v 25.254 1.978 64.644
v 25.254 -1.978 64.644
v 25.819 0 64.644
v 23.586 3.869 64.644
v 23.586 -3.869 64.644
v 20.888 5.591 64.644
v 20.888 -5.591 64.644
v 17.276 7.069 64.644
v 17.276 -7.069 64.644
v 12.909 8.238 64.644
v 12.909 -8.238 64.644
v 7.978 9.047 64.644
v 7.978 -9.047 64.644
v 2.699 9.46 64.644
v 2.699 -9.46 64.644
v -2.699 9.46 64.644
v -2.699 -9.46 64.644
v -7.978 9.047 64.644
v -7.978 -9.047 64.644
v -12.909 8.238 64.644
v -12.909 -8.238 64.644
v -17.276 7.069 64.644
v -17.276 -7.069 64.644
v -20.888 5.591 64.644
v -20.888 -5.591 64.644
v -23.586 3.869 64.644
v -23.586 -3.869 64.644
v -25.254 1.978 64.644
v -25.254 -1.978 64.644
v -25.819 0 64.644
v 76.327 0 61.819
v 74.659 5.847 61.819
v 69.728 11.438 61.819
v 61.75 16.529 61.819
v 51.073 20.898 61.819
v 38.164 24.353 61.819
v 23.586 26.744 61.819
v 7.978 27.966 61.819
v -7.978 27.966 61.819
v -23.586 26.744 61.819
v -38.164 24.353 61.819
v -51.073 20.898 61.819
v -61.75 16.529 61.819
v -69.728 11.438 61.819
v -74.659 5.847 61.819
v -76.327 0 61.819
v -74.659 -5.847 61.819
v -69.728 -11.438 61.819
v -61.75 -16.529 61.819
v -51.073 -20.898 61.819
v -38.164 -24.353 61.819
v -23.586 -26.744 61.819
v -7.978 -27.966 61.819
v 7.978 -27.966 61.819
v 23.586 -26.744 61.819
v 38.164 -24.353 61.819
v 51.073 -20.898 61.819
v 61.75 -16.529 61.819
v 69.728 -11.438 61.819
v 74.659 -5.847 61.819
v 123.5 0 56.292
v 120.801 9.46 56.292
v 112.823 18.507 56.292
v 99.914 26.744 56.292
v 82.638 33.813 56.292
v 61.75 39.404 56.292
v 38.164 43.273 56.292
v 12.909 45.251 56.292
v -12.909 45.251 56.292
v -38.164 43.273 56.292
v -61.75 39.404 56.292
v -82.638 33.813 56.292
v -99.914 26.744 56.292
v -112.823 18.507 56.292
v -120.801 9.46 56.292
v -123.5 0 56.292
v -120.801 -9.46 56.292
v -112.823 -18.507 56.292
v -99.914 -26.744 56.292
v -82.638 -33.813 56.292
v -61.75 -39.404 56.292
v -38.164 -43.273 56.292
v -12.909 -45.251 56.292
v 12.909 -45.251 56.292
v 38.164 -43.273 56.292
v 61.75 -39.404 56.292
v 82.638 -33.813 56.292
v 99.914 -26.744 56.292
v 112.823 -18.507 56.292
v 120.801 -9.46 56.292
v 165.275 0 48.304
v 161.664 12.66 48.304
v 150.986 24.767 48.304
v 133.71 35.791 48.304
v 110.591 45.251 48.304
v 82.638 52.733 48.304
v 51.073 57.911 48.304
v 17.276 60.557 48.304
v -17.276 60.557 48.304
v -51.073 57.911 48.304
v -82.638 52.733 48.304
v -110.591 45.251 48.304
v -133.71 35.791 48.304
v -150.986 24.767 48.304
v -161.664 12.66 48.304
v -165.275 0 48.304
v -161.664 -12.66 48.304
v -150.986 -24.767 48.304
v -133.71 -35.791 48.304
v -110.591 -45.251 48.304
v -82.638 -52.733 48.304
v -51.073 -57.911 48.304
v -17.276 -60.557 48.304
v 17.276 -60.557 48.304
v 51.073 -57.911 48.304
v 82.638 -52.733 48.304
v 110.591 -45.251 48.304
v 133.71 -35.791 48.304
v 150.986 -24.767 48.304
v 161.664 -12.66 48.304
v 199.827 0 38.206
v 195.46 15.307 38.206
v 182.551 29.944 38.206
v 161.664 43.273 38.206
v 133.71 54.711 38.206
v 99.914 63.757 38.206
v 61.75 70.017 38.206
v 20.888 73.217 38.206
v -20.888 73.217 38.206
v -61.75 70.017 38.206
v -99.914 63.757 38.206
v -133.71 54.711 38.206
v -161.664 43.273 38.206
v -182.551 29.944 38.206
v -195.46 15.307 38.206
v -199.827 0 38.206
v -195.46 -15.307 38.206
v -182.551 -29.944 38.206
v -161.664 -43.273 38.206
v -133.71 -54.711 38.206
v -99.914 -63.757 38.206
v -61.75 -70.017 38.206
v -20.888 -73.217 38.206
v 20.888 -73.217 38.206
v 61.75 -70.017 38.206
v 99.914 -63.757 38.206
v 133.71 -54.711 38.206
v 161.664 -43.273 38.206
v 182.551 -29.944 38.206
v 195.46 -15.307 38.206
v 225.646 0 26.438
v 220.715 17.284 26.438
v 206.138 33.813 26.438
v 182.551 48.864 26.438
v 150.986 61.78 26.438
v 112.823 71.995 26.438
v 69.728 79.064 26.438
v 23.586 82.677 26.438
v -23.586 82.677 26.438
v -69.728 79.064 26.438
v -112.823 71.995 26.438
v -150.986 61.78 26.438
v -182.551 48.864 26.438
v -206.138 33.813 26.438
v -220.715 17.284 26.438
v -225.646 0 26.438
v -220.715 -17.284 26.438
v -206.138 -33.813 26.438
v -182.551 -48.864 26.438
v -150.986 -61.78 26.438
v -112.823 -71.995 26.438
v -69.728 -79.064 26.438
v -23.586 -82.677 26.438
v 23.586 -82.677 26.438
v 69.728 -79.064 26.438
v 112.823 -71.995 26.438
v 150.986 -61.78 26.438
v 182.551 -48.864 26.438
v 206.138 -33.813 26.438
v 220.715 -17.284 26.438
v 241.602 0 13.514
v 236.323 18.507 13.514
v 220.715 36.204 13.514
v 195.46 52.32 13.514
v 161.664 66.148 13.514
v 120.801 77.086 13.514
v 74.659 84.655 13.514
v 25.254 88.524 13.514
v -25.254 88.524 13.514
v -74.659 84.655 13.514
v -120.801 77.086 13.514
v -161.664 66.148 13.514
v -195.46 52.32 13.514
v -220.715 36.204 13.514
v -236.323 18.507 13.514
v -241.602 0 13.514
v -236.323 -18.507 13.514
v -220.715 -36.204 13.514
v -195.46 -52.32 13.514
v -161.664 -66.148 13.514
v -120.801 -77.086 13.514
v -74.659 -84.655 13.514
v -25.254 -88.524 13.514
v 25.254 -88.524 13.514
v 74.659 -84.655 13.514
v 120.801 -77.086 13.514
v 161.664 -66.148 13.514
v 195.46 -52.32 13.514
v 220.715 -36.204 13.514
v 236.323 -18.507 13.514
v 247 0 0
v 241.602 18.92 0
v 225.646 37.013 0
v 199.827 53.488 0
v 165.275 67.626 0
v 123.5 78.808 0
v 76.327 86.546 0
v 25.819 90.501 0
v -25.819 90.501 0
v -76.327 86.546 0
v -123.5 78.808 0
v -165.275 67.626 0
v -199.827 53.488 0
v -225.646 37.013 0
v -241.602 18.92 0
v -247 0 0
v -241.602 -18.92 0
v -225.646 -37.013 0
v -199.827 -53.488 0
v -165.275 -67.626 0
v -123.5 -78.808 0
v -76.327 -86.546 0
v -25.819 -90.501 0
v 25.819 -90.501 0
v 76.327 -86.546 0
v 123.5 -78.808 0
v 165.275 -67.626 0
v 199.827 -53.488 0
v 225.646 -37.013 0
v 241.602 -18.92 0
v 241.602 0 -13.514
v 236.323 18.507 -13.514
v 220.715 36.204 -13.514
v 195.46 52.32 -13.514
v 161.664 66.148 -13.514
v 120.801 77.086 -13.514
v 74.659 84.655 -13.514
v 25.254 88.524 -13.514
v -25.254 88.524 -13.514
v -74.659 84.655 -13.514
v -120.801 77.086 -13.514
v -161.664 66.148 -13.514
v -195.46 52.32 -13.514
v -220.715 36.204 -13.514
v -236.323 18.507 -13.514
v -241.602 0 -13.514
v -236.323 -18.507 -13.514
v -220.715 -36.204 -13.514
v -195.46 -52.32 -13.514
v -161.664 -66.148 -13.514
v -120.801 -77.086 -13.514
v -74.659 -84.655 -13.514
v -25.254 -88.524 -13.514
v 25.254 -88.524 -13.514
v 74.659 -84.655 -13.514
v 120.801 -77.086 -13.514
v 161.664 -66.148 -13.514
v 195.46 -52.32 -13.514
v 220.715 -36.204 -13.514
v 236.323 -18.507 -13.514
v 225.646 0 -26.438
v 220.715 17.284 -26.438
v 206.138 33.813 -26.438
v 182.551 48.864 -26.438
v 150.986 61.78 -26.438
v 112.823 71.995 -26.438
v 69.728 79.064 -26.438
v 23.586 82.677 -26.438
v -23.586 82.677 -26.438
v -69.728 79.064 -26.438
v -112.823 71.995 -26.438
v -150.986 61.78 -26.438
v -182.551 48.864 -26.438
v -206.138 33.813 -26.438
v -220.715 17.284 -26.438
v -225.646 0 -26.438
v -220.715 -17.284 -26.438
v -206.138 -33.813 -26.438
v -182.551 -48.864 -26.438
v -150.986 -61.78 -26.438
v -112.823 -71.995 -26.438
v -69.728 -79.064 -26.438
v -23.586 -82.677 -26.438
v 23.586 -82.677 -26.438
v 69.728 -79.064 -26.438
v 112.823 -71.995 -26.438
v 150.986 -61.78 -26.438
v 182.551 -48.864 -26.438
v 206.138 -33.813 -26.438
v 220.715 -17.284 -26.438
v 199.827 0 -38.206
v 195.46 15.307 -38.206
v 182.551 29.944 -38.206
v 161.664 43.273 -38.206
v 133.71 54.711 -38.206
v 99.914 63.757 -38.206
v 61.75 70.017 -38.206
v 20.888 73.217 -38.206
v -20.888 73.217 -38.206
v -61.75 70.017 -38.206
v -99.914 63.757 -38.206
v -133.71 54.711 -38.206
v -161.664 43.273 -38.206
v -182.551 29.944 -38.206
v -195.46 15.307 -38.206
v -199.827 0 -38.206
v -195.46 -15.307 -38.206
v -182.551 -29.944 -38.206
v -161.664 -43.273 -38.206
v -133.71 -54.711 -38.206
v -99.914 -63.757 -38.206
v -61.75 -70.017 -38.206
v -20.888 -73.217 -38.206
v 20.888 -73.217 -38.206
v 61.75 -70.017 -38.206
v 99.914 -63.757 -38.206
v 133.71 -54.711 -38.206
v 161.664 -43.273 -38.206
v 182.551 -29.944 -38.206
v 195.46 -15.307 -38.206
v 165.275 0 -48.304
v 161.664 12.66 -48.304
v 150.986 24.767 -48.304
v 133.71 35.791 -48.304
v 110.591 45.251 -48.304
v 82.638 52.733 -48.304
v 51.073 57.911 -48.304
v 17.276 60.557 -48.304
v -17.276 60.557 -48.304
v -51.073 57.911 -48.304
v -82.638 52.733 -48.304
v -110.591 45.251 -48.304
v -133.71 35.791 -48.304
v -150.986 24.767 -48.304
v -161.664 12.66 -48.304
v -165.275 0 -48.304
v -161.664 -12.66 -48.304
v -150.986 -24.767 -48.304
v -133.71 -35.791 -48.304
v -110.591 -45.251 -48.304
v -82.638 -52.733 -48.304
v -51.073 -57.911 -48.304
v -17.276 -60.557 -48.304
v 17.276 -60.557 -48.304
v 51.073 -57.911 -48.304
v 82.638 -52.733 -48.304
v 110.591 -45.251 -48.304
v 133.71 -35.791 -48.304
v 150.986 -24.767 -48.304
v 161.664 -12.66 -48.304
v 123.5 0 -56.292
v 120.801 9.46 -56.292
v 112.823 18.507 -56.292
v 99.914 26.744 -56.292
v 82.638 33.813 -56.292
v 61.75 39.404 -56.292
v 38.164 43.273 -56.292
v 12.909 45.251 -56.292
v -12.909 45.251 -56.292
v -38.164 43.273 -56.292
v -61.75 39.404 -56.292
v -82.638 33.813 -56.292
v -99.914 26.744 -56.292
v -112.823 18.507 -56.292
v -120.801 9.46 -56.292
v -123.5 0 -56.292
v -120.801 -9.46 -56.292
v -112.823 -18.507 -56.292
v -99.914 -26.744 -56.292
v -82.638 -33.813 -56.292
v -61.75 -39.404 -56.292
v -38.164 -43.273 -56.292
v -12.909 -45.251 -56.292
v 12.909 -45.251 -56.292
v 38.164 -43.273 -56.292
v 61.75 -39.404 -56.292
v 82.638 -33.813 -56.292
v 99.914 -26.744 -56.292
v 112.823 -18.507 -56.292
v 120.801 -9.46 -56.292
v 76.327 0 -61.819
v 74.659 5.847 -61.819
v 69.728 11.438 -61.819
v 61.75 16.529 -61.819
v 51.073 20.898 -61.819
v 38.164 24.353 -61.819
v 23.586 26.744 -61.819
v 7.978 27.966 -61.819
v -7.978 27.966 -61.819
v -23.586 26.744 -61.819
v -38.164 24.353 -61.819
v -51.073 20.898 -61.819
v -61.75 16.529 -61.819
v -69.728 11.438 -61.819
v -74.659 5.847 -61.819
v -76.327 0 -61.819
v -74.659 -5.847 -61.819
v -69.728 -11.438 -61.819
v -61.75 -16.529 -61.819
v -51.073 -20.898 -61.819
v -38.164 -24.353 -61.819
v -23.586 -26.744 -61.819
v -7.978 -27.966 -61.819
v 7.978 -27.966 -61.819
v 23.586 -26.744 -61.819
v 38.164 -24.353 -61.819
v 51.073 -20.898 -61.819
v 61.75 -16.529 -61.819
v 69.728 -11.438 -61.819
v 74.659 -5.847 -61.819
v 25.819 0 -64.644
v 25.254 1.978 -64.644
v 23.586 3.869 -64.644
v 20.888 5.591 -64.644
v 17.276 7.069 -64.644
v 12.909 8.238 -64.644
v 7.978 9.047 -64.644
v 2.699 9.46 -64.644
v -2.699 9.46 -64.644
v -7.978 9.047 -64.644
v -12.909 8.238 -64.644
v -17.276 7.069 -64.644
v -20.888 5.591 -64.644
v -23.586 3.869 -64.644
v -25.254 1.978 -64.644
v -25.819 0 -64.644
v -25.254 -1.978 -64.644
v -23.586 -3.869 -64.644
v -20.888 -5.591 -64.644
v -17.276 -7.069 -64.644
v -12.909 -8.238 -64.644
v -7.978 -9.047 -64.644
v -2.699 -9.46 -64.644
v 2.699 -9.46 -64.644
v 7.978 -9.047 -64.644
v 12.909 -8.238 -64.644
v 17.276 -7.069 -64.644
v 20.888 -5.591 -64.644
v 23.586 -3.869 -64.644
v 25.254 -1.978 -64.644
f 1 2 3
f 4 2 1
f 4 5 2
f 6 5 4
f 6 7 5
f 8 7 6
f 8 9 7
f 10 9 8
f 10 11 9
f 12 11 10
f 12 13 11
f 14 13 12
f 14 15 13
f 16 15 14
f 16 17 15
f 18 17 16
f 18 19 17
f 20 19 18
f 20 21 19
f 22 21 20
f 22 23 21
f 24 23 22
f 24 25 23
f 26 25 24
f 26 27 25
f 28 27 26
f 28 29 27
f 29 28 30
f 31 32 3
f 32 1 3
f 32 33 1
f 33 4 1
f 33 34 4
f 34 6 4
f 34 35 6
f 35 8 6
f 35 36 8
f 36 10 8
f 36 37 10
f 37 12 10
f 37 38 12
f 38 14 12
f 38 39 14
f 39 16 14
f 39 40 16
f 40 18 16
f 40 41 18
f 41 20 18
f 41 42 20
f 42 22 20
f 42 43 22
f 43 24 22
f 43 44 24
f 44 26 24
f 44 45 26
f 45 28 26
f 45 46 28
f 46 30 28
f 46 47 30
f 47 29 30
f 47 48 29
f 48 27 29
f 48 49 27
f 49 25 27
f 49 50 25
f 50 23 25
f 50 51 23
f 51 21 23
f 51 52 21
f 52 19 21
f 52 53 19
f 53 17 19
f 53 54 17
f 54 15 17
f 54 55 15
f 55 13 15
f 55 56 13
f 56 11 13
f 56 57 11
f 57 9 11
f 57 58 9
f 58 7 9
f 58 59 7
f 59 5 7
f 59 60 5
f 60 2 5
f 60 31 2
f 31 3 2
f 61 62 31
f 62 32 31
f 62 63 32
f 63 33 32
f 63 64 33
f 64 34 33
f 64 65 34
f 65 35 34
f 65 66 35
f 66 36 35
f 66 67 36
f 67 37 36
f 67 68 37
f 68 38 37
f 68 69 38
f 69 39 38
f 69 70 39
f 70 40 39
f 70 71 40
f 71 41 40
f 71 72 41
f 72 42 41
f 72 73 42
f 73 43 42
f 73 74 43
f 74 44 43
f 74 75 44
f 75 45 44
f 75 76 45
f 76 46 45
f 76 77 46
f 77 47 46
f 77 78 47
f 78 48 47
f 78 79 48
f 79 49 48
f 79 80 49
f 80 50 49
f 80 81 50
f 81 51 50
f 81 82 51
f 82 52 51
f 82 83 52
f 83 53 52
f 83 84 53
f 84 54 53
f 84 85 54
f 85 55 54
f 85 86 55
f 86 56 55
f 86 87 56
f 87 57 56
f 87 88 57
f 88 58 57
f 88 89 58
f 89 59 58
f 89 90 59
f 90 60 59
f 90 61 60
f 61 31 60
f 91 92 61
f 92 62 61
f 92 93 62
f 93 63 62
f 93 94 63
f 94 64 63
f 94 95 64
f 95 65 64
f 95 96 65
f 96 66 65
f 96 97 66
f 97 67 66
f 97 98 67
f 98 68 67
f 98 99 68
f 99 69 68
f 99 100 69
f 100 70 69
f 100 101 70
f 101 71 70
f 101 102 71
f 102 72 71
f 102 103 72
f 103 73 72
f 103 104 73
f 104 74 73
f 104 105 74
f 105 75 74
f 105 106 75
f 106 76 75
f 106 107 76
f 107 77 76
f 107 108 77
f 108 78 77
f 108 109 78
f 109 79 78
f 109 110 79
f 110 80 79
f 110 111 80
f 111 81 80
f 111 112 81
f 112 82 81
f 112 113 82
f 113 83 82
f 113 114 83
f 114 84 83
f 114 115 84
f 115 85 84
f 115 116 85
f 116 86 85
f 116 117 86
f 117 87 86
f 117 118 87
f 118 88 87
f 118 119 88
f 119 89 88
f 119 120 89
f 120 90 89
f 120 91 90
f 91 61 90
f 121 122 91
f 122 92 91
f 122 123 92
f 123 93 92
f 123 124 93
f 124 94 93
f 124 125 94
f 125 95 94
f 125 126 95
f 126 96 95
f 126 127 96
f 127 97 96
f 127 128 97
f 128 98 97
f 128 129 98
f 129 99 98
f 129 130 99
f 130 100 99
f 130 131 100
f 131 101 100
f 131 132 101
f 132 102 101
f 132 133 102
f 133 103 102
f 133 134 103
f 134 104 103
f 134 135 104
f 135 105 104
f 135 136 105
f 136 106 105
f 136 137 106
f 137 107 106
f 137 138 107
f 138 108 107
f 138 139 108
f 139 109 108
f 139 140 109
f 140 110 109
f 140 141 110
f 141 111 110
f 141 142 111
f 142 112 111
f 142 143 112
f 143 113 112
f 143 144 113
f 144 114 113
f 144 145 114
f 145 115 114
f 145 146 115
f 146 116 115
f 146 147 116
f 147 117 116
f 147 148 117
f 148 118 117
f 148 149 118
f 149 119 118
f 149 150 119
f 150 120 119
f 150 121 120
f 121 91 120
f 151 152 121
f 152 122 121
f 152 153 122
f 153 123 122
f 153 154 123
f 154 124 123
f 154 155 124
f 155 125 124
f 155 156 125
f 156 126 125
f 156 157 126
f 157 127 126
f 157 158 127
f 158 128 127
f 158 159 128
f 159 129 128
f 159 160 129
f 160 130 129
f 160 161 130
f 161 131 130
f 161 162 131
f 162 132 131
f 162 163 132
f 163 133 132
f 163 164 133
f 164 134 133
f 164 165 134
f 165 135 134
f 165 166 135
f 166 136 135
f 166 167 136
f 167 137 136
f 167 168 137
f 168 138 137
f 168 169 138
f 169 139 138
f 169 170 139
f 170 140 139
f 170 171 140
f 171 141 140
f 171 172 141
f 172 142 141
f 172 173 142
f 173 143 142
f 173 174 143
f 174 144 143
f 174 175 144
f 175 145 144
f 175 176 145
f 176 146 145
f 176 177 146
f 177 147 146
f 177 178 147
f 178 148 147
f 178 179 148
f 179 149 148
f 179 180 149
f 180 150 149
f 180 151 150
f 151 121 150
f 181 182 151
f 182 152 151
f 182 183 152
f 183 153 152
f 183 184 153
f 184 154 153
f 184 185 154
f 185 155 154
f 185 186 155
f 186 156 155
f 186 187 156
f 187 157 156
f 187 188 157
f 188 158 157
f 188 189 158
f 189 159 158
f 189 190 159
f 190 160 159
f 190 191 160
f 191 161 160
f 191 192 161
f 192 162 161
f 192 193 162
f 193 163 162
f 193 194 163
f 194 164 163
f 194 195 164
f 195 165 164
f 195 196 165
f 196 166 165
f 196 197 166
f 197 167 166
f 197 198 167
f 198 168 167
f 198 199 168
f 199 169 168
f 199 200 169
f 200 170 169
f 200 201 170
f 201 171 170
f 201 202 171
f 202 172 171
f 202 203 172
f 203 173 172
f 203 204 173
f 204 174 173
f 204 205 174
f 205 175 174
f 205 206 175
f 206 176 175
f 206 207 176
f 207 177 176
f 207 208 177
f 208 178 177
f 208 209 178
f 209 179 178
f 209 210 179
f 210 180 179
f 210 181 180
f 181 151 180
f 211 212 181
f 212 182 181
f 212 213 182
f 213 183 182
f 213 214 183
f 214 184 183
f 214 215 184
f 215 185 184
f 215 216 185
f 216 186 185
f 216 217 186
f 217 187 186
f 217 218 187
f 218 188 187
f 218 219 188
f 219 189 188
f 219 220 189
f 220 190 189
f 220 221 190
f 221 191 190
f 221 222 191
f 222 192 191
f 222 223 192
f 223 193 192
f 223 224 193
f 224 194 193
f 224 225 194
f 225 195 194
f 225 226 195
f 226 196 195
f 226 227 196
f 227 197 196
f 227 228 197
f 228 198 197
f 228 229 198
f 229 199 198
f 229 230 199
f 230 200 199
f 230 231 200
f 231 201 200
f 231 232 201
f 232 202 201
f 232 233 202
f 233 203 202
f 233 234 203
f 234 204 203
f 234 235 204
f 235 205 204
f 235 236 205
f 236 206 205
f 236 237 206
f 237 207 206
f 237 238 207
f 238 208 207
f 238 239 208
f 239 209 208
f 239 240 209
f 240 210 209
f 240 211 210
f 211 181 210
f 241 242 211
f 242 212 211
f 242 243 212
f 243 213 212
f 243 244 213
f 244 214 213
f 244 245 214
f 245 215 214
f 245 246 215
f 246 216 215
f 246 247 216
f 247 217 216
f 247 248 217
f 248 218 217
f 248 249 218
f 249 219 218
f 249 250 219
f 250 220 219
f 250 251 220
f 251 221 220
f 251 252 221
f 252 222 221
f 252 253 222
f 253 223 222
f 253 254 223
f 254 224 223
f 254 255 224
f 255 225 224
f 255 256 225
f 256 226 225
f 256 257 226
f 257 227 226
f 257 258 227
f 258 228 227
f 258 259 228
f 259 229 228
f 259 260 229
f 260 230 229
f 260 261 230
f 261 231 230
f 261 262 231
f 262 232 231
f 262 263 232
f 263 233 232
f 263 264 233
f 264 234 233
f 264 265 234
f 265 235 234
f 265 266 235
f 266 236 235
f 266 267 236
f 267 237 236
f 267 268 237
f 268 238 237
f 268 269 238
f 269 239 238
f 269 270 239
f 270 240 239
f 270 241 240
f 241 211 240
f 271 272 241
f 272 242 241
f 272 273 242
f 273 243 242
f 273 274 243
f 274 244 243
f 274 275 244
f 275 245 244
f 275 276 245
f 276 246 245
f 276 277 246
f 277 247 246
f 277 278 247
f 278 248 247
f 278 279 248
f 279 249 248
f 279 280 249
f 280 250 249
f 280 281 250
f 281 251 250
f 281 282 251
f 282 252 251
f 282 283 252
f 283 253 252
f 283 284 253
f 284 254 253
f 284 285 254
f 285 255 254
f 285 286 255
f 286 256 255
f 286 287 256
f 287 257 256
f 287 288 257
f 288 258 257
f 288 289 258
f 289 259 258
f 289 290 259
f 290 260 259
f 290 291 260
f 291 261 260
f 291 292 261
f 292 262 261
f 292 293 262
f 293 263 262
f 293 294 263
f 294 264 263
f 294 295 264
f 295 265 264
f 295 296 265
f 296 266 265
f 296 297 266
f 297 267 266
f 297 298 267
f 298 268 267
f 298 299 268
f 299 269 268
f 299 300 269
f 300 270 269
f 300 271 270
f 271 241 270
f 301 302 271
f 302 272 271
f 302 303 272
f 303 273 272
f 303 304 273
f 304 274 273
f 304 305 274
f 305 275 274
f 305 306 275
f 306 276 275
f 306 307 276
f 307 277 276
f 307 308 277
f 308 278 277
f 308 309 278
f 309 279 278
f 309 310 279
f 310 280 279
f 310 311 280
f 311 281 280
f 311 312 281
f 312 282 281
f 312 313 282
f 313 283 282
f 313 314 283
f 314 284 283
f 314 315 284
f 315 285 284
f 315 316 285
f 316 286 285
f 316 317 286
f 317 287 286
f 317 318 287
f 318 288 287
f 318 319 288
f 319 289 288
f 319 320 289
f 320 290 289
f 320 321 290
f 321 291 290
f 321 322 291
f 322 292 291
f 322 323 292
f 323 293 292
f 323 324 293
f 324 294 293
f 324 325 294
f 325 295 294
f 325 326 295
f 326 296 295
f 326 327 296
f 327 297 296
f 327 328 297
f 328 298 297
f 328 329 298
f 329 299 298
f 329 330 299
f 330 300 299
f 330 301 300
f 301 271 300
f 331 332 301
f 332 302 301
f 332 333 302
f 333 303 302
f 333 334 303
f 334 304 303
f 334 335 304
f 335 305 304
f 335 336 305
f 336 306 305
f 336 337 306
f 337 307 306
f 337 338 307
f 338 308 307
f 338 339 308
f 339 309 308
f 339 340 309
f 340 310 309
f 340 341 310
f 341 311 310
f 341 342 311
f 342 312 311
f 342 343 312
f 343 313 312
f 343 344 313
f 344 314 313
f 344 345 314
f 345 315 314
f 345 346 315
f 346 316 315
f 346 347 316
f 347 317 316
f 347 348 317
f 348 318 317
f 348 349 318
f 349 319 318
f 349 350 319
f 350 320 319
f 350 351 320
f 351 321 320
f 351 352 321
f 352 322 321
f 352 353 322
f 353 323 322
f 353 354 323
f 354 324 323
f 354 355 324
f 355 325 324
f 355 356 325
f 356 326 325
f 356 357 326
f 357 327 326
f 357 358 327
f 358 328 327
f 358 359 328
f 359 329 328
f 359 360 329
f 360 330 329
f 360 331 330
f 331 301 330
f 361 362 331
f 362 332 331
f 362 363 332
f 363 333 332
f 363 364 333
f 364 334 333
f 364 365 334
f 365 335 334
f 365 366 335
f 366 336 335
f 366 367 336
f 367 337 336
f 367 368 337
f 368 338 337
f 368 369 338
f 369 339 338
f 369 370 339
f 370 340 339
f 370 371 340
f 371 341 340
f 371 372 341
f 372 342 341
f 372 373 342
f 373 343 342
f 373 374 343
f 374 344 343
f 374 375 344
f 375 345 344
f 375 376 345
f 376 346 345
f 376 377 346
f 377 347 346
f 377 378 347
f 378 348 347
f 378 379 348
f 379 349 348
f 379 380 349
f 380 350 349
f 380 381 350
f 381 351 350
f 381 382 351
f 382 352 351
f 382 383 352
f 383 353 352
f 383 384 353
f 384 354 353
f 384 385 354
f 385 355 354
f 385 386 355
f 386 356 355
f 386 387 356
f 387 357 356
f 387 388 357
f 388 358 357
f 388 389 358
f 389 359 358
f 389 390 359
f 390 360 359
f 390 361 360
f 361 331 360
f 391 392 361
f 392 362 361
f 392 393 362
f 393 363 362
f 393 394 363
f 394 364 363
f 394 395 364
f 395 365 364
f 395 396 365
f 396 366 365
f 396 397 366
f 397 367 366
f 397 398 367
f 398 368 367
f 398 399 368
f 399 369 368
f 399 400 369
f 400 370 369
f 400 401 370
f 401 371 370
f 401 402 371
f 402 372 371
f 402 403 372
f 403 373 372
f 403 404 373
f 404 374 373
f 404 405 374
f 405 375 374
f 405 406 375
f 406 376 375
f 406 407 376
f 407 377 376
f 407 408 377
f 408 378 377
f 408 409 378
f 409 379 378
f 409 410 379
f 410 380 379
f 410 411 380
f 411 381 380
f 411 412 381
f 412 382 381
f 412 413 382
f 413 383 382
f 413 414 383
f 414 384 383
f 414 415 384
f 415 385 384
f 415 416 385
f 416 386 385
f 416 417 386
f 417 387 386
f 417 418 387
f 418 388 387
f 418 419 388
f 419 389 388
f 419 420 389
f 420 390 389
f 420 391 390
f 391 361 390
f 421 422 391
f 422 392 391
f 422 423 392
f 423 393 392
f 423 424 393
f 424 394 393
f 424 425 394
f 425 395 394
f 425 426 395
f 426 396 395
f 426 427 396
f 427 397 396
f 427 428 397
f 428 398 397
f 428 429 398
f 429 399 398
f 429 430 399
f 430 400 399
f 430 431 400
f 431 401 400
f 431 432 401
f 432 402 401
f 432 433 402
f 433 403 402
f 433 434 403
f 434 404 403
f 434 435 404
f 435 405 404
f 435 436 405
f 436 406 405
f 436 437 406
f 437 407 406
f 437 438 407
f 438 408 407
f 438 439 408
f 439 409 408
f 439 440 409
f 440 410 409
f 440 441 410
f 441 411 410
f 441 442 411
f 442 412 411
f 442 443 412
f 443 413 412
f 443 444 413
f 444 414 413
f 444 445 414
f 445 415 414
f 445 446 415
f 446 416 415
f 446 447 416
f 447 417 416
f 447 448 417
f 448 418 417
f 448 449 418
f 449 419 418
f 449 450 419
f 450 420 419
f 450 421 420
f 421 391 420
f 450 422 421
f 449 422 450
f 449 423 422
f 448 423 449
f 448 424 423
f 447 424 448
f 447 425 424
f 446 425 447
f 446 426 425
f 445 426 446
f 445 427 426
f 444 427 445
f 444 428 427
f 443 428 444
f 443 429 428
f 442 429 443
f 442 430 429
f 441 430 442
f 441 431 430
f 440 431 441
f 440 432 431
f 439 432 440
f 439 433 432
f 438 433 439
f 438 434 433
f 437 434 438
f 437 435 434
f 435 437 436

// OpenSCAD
// Generated by SolidPython 1.0.1 on 2020-07-29 00:46:53


scale(v = [19, 7, 5]) {
	sphere(r = 13);
}
/***********************************************
*********      SolidPython code:      **********
************************************************
 
# import packages: SolidPython
from solid import *
from solid.utils import *
from itertools import chain, combinations, permutations


class Resize:

    def __init__(self, scad_file):
        self.scad_file = scad_file
        #self.scad_file = import_scad(scad_file)
        # cone/cylinder param:
        self.r1 = 0
        self.r2 = 0
        self.h = 0
        # rectangular prism param:
        self.w = 0
        self.l = 0
        # ellipse param:
        self.r = 0

    # import OpenScad code (file name corresponds to shape)


    # classify shape + parameters
    def assign(self, param1, param2, param3):
        if self.scad_file == 'cone.scad':
            self.r1 = param1
            self.r2 = param2
            self.h = param3
        elif self.scad_file == 'cylinder.scad':
            self.r1 = param1
            self.r2 = param2
            self.h = param3
        elif self.scad_file == 'rectangularPrism.scad':
            self.h = param1
            self.l = param2
            self.w = param3
        else:
            self.r = param1
            self.h = param2

    # resize parameters
    def iterate(self):
        x = range(3, 20, 2)
        i = 1
        if self.scad_file == 'cone.scad':
            tempList = list(permutations(x, 2))
            for temp in tempList:
                param1 = temp[0]
                param2 = temp[1]
                filepath = 'produced_scad_files/' + 'cone' + str(param1) + '_' + str(param2) + '_' + '.scad'
                scad_render_to_file(cylinder(h=param1, r1=param2, r2=0), filepath)

        elif self.scad_file == 'cylinder.scad':
            tempList = list(permutations(x, 3))
            for temp in tempList:
                param1 = temp[0]
                param2 = temp[1]
                filepath = 'produced_scad_files/' + 'cylinder' + str(param1) + '_' + str(param2) + '_' + '.scad'
                scad_render_to_file(cylinder(h=param1, r1=param2, r2=param2), filepath)

        elif self.scad_file == 'rectangularPrism.scad':
            tempList = list(permutations(x, 3))
            for temp in tempList:
                param1 = temp[0]
                param2 = temp[1]
                param3 = temp[2]
                filepath = 'produced_scad_files/' + 'rectangularPrism' + str(param1) + '_' + str(param2) + '_' + str(
                    param3) + '.scad'
                scad_render_to_file(cube(size=(param1, param2, param3)), filepath)

        elif self.scad_file == 'ellipse.scad':
            tempList = list(permutations(x, 4))
            for temp in tempList:
                param1 = temp[0]
                param2 = temp[1]
                param3 = temp[2]
                param4 = temp[3]
                filepath = 'produced_scad_files/' + 'ellipse' + str(param1) + '_' + str(param2) + '_' + str(param3) + '_' + str(param4) + '.scad'
                scad_render_to_file(scale([param1, param2, param3])(sphere(r=param4)), filepath)

    def render_to_scadfile(self):
        scad_render_to_file(scad, 'example.scad') 
 
************************************************/
